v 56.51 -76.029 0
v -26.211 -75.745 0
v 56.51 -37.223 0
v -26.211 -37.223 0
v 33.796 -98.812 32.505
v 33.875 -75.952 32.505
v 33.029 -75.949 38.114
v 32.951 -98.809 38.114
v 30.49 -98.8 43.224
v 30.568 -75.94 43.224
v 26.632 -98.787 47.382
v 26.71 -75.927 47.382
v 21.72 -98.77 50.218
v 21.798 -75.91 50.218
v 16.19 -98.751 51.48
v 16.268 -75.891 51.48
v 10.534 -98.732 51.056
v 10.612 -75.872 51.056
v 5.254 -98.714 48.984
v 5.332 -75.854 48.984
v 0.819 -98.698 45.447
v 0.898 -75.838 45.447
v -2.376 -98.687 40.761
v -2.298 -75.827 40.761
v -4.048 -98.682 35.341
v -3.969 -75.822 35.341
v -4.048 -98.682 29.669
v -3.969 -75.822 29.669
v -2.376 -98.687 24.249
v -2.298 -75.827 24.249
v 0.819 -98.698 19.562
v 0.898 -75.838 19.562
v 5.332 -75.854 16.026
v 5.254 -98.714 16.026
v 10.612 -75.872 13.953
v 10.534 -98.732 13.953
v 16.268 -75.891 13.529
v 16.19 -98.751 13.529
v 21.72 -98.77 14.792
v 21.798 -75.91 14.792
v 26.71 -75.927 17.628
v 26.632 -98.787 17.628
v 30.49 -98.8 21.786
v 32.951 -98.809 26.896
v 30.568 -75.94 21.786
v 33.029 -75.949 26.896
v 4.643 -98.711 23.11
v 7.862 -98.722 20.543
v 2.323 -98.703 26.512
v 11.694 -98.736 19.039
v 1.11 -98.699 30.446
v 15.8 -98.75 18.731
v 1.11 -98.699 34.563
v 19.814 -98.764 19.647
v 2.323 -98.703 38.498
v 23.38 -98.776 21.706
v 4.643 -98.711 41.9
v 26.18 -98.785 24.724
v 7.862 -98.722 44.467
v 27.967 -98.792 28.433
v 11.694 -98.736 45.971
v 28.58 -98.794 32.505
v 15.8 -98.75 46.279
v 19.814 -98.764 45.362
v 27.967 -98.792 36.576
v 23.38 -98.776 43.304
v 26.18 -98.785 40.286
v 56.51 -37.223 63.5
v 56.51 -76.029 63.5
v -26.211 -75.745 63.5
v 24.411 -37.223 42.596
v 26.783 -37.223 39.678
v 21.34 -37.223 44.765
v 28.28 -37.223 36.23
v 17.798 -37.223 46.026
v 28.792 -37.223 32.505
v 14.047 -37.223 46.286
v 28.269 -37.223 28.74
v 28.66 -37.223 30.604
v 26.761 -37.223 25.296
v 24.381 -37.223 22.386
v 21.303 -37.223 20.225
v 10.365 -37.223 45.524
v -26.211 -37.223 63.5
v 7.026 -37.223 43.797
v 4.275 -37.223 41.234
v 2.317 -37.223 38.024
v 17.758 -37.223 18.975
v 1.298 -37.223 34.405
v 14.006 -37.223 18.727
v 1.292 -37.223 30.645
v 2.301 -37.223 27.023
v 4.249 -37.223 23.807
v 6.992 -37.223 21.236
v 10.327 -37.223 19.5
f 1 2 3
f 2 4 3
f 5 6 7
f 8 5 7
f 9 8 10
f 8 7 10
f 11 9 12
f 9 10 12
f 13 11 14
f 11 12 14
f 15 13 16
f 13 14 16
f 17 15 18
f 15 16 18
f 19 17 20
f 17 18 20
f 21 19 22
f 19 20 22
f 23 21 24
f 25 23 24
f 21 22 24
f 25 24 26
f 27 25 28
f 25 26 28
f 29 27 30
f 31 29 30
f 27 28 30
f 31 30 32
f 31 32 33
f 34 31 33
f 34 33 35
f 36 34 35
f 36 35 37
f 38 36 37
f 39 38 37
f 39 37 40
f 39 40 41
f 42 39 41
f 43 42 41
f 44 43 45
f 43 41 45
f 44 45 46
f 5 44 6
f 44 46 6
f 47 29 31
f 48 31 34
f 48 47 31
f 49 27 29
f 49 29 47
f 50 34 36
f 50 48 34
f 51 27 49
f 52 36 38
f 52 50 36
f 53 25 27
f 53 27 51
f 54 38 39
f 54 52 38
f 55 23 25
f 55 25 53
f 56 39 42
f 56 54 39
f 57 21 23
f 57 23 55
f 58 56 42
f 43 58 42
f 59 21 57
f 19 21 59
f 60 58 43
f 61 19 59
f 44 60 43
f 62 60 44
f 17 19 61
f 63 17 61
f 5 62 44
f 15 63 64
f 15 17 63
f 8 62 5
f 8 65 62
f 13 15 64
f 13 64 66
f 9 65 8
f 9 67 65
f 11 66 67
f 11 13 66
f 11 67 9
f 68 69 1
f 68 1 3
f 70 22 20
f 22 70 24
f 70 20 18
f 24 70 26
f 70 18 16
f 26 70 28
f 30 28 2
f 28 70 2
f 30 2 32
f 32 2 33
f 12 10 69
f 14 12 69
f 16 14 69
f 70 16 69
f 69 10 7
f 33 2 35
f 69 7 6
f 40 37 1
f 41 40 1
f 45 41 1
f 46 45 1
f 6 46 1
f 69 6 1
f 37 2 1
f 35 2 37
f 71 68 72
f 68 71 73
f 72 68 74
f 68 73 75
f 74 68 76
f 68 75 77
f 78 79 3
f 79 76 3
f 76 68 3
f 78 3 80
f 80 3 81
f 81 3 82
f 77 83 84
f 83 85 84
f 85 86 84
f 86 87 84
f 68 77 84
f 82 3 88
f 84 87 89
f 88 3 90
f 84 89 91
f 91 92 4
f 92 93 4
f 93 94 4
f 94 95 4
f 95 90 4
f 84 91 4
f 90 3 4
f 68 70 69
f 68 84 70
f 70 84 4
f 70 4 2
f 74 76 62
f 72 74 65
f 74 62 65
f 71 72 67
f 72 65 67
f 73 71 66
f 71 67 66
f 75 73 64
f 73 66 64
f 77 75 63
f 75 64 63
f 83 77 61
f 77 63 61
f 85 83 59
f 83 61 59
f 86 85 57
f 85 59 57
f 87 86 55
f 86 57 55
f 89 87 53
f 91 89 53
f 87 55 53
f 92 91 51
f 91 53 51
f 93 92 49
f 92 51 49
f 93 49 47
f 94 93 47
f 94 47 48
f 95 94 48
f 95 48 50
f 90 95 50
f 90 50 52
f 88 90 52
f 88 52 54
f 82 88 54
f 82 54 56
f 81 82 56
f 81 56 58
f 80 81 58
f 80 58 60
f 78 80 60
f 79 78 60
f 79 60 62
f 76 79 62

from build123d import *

# Parameters (mm, degrees)
F1_DEPTH      = 63.5
F2_R          = 19.0285497791
F3_DEPTH      = 22.86
F4_R          = 13.812440818
F5_DEPTH      = 0.2070362903
F5_DEPTH_BACK = 61.6676449049


with BuildPart() as f1:
    # F0 (on Top) → F1 (new body)
    with BuildSketch(Plane.XY):
        Polygon((-26.2109767646, -75.7453498801), (56.5097033978, -76.0293745441), (56.5097033978, -37.2225008905), (-26.2109767646, -37.2225008905), align=None)
    extrude(amount=F1_DEPTH)

    # F2 (on face) → F3 (join)
    with BuildSketch(Plane(origin=(-0.2603805333, -75.8344522589, 0), x_dir=(0.9999941055, -0.0034335185, 0), z_dir=(-0.0034335185, -0.9999941055, 0))):
        with Locations((15.1068782434, 32.5047820807)):
            Circle(F2_R)
    extrude(amount=F3_DEPTH)

    # F4 (on face) → F5 (cut, two sides)
    with BuildSketch(Plane(origin=(-0.3388707674, -98.6943175097, 0), x_dir=(0.9999941055, -0.0034335185, 0), z_dir=(-0.0034335185, -0.9999941055, 0))) as f5_sk:
        with Locations((15.1068782434, 32.5047820807)):
            Circle(F4_R)
    extrude(amount=F5_DEPTH, mode=Mode.SUBTRACT)
    extrude(f5_sk.sketch, amount=-F5_DEPTH_BACK, mode=Mode.SUBTRACT)


solid = f1.part
